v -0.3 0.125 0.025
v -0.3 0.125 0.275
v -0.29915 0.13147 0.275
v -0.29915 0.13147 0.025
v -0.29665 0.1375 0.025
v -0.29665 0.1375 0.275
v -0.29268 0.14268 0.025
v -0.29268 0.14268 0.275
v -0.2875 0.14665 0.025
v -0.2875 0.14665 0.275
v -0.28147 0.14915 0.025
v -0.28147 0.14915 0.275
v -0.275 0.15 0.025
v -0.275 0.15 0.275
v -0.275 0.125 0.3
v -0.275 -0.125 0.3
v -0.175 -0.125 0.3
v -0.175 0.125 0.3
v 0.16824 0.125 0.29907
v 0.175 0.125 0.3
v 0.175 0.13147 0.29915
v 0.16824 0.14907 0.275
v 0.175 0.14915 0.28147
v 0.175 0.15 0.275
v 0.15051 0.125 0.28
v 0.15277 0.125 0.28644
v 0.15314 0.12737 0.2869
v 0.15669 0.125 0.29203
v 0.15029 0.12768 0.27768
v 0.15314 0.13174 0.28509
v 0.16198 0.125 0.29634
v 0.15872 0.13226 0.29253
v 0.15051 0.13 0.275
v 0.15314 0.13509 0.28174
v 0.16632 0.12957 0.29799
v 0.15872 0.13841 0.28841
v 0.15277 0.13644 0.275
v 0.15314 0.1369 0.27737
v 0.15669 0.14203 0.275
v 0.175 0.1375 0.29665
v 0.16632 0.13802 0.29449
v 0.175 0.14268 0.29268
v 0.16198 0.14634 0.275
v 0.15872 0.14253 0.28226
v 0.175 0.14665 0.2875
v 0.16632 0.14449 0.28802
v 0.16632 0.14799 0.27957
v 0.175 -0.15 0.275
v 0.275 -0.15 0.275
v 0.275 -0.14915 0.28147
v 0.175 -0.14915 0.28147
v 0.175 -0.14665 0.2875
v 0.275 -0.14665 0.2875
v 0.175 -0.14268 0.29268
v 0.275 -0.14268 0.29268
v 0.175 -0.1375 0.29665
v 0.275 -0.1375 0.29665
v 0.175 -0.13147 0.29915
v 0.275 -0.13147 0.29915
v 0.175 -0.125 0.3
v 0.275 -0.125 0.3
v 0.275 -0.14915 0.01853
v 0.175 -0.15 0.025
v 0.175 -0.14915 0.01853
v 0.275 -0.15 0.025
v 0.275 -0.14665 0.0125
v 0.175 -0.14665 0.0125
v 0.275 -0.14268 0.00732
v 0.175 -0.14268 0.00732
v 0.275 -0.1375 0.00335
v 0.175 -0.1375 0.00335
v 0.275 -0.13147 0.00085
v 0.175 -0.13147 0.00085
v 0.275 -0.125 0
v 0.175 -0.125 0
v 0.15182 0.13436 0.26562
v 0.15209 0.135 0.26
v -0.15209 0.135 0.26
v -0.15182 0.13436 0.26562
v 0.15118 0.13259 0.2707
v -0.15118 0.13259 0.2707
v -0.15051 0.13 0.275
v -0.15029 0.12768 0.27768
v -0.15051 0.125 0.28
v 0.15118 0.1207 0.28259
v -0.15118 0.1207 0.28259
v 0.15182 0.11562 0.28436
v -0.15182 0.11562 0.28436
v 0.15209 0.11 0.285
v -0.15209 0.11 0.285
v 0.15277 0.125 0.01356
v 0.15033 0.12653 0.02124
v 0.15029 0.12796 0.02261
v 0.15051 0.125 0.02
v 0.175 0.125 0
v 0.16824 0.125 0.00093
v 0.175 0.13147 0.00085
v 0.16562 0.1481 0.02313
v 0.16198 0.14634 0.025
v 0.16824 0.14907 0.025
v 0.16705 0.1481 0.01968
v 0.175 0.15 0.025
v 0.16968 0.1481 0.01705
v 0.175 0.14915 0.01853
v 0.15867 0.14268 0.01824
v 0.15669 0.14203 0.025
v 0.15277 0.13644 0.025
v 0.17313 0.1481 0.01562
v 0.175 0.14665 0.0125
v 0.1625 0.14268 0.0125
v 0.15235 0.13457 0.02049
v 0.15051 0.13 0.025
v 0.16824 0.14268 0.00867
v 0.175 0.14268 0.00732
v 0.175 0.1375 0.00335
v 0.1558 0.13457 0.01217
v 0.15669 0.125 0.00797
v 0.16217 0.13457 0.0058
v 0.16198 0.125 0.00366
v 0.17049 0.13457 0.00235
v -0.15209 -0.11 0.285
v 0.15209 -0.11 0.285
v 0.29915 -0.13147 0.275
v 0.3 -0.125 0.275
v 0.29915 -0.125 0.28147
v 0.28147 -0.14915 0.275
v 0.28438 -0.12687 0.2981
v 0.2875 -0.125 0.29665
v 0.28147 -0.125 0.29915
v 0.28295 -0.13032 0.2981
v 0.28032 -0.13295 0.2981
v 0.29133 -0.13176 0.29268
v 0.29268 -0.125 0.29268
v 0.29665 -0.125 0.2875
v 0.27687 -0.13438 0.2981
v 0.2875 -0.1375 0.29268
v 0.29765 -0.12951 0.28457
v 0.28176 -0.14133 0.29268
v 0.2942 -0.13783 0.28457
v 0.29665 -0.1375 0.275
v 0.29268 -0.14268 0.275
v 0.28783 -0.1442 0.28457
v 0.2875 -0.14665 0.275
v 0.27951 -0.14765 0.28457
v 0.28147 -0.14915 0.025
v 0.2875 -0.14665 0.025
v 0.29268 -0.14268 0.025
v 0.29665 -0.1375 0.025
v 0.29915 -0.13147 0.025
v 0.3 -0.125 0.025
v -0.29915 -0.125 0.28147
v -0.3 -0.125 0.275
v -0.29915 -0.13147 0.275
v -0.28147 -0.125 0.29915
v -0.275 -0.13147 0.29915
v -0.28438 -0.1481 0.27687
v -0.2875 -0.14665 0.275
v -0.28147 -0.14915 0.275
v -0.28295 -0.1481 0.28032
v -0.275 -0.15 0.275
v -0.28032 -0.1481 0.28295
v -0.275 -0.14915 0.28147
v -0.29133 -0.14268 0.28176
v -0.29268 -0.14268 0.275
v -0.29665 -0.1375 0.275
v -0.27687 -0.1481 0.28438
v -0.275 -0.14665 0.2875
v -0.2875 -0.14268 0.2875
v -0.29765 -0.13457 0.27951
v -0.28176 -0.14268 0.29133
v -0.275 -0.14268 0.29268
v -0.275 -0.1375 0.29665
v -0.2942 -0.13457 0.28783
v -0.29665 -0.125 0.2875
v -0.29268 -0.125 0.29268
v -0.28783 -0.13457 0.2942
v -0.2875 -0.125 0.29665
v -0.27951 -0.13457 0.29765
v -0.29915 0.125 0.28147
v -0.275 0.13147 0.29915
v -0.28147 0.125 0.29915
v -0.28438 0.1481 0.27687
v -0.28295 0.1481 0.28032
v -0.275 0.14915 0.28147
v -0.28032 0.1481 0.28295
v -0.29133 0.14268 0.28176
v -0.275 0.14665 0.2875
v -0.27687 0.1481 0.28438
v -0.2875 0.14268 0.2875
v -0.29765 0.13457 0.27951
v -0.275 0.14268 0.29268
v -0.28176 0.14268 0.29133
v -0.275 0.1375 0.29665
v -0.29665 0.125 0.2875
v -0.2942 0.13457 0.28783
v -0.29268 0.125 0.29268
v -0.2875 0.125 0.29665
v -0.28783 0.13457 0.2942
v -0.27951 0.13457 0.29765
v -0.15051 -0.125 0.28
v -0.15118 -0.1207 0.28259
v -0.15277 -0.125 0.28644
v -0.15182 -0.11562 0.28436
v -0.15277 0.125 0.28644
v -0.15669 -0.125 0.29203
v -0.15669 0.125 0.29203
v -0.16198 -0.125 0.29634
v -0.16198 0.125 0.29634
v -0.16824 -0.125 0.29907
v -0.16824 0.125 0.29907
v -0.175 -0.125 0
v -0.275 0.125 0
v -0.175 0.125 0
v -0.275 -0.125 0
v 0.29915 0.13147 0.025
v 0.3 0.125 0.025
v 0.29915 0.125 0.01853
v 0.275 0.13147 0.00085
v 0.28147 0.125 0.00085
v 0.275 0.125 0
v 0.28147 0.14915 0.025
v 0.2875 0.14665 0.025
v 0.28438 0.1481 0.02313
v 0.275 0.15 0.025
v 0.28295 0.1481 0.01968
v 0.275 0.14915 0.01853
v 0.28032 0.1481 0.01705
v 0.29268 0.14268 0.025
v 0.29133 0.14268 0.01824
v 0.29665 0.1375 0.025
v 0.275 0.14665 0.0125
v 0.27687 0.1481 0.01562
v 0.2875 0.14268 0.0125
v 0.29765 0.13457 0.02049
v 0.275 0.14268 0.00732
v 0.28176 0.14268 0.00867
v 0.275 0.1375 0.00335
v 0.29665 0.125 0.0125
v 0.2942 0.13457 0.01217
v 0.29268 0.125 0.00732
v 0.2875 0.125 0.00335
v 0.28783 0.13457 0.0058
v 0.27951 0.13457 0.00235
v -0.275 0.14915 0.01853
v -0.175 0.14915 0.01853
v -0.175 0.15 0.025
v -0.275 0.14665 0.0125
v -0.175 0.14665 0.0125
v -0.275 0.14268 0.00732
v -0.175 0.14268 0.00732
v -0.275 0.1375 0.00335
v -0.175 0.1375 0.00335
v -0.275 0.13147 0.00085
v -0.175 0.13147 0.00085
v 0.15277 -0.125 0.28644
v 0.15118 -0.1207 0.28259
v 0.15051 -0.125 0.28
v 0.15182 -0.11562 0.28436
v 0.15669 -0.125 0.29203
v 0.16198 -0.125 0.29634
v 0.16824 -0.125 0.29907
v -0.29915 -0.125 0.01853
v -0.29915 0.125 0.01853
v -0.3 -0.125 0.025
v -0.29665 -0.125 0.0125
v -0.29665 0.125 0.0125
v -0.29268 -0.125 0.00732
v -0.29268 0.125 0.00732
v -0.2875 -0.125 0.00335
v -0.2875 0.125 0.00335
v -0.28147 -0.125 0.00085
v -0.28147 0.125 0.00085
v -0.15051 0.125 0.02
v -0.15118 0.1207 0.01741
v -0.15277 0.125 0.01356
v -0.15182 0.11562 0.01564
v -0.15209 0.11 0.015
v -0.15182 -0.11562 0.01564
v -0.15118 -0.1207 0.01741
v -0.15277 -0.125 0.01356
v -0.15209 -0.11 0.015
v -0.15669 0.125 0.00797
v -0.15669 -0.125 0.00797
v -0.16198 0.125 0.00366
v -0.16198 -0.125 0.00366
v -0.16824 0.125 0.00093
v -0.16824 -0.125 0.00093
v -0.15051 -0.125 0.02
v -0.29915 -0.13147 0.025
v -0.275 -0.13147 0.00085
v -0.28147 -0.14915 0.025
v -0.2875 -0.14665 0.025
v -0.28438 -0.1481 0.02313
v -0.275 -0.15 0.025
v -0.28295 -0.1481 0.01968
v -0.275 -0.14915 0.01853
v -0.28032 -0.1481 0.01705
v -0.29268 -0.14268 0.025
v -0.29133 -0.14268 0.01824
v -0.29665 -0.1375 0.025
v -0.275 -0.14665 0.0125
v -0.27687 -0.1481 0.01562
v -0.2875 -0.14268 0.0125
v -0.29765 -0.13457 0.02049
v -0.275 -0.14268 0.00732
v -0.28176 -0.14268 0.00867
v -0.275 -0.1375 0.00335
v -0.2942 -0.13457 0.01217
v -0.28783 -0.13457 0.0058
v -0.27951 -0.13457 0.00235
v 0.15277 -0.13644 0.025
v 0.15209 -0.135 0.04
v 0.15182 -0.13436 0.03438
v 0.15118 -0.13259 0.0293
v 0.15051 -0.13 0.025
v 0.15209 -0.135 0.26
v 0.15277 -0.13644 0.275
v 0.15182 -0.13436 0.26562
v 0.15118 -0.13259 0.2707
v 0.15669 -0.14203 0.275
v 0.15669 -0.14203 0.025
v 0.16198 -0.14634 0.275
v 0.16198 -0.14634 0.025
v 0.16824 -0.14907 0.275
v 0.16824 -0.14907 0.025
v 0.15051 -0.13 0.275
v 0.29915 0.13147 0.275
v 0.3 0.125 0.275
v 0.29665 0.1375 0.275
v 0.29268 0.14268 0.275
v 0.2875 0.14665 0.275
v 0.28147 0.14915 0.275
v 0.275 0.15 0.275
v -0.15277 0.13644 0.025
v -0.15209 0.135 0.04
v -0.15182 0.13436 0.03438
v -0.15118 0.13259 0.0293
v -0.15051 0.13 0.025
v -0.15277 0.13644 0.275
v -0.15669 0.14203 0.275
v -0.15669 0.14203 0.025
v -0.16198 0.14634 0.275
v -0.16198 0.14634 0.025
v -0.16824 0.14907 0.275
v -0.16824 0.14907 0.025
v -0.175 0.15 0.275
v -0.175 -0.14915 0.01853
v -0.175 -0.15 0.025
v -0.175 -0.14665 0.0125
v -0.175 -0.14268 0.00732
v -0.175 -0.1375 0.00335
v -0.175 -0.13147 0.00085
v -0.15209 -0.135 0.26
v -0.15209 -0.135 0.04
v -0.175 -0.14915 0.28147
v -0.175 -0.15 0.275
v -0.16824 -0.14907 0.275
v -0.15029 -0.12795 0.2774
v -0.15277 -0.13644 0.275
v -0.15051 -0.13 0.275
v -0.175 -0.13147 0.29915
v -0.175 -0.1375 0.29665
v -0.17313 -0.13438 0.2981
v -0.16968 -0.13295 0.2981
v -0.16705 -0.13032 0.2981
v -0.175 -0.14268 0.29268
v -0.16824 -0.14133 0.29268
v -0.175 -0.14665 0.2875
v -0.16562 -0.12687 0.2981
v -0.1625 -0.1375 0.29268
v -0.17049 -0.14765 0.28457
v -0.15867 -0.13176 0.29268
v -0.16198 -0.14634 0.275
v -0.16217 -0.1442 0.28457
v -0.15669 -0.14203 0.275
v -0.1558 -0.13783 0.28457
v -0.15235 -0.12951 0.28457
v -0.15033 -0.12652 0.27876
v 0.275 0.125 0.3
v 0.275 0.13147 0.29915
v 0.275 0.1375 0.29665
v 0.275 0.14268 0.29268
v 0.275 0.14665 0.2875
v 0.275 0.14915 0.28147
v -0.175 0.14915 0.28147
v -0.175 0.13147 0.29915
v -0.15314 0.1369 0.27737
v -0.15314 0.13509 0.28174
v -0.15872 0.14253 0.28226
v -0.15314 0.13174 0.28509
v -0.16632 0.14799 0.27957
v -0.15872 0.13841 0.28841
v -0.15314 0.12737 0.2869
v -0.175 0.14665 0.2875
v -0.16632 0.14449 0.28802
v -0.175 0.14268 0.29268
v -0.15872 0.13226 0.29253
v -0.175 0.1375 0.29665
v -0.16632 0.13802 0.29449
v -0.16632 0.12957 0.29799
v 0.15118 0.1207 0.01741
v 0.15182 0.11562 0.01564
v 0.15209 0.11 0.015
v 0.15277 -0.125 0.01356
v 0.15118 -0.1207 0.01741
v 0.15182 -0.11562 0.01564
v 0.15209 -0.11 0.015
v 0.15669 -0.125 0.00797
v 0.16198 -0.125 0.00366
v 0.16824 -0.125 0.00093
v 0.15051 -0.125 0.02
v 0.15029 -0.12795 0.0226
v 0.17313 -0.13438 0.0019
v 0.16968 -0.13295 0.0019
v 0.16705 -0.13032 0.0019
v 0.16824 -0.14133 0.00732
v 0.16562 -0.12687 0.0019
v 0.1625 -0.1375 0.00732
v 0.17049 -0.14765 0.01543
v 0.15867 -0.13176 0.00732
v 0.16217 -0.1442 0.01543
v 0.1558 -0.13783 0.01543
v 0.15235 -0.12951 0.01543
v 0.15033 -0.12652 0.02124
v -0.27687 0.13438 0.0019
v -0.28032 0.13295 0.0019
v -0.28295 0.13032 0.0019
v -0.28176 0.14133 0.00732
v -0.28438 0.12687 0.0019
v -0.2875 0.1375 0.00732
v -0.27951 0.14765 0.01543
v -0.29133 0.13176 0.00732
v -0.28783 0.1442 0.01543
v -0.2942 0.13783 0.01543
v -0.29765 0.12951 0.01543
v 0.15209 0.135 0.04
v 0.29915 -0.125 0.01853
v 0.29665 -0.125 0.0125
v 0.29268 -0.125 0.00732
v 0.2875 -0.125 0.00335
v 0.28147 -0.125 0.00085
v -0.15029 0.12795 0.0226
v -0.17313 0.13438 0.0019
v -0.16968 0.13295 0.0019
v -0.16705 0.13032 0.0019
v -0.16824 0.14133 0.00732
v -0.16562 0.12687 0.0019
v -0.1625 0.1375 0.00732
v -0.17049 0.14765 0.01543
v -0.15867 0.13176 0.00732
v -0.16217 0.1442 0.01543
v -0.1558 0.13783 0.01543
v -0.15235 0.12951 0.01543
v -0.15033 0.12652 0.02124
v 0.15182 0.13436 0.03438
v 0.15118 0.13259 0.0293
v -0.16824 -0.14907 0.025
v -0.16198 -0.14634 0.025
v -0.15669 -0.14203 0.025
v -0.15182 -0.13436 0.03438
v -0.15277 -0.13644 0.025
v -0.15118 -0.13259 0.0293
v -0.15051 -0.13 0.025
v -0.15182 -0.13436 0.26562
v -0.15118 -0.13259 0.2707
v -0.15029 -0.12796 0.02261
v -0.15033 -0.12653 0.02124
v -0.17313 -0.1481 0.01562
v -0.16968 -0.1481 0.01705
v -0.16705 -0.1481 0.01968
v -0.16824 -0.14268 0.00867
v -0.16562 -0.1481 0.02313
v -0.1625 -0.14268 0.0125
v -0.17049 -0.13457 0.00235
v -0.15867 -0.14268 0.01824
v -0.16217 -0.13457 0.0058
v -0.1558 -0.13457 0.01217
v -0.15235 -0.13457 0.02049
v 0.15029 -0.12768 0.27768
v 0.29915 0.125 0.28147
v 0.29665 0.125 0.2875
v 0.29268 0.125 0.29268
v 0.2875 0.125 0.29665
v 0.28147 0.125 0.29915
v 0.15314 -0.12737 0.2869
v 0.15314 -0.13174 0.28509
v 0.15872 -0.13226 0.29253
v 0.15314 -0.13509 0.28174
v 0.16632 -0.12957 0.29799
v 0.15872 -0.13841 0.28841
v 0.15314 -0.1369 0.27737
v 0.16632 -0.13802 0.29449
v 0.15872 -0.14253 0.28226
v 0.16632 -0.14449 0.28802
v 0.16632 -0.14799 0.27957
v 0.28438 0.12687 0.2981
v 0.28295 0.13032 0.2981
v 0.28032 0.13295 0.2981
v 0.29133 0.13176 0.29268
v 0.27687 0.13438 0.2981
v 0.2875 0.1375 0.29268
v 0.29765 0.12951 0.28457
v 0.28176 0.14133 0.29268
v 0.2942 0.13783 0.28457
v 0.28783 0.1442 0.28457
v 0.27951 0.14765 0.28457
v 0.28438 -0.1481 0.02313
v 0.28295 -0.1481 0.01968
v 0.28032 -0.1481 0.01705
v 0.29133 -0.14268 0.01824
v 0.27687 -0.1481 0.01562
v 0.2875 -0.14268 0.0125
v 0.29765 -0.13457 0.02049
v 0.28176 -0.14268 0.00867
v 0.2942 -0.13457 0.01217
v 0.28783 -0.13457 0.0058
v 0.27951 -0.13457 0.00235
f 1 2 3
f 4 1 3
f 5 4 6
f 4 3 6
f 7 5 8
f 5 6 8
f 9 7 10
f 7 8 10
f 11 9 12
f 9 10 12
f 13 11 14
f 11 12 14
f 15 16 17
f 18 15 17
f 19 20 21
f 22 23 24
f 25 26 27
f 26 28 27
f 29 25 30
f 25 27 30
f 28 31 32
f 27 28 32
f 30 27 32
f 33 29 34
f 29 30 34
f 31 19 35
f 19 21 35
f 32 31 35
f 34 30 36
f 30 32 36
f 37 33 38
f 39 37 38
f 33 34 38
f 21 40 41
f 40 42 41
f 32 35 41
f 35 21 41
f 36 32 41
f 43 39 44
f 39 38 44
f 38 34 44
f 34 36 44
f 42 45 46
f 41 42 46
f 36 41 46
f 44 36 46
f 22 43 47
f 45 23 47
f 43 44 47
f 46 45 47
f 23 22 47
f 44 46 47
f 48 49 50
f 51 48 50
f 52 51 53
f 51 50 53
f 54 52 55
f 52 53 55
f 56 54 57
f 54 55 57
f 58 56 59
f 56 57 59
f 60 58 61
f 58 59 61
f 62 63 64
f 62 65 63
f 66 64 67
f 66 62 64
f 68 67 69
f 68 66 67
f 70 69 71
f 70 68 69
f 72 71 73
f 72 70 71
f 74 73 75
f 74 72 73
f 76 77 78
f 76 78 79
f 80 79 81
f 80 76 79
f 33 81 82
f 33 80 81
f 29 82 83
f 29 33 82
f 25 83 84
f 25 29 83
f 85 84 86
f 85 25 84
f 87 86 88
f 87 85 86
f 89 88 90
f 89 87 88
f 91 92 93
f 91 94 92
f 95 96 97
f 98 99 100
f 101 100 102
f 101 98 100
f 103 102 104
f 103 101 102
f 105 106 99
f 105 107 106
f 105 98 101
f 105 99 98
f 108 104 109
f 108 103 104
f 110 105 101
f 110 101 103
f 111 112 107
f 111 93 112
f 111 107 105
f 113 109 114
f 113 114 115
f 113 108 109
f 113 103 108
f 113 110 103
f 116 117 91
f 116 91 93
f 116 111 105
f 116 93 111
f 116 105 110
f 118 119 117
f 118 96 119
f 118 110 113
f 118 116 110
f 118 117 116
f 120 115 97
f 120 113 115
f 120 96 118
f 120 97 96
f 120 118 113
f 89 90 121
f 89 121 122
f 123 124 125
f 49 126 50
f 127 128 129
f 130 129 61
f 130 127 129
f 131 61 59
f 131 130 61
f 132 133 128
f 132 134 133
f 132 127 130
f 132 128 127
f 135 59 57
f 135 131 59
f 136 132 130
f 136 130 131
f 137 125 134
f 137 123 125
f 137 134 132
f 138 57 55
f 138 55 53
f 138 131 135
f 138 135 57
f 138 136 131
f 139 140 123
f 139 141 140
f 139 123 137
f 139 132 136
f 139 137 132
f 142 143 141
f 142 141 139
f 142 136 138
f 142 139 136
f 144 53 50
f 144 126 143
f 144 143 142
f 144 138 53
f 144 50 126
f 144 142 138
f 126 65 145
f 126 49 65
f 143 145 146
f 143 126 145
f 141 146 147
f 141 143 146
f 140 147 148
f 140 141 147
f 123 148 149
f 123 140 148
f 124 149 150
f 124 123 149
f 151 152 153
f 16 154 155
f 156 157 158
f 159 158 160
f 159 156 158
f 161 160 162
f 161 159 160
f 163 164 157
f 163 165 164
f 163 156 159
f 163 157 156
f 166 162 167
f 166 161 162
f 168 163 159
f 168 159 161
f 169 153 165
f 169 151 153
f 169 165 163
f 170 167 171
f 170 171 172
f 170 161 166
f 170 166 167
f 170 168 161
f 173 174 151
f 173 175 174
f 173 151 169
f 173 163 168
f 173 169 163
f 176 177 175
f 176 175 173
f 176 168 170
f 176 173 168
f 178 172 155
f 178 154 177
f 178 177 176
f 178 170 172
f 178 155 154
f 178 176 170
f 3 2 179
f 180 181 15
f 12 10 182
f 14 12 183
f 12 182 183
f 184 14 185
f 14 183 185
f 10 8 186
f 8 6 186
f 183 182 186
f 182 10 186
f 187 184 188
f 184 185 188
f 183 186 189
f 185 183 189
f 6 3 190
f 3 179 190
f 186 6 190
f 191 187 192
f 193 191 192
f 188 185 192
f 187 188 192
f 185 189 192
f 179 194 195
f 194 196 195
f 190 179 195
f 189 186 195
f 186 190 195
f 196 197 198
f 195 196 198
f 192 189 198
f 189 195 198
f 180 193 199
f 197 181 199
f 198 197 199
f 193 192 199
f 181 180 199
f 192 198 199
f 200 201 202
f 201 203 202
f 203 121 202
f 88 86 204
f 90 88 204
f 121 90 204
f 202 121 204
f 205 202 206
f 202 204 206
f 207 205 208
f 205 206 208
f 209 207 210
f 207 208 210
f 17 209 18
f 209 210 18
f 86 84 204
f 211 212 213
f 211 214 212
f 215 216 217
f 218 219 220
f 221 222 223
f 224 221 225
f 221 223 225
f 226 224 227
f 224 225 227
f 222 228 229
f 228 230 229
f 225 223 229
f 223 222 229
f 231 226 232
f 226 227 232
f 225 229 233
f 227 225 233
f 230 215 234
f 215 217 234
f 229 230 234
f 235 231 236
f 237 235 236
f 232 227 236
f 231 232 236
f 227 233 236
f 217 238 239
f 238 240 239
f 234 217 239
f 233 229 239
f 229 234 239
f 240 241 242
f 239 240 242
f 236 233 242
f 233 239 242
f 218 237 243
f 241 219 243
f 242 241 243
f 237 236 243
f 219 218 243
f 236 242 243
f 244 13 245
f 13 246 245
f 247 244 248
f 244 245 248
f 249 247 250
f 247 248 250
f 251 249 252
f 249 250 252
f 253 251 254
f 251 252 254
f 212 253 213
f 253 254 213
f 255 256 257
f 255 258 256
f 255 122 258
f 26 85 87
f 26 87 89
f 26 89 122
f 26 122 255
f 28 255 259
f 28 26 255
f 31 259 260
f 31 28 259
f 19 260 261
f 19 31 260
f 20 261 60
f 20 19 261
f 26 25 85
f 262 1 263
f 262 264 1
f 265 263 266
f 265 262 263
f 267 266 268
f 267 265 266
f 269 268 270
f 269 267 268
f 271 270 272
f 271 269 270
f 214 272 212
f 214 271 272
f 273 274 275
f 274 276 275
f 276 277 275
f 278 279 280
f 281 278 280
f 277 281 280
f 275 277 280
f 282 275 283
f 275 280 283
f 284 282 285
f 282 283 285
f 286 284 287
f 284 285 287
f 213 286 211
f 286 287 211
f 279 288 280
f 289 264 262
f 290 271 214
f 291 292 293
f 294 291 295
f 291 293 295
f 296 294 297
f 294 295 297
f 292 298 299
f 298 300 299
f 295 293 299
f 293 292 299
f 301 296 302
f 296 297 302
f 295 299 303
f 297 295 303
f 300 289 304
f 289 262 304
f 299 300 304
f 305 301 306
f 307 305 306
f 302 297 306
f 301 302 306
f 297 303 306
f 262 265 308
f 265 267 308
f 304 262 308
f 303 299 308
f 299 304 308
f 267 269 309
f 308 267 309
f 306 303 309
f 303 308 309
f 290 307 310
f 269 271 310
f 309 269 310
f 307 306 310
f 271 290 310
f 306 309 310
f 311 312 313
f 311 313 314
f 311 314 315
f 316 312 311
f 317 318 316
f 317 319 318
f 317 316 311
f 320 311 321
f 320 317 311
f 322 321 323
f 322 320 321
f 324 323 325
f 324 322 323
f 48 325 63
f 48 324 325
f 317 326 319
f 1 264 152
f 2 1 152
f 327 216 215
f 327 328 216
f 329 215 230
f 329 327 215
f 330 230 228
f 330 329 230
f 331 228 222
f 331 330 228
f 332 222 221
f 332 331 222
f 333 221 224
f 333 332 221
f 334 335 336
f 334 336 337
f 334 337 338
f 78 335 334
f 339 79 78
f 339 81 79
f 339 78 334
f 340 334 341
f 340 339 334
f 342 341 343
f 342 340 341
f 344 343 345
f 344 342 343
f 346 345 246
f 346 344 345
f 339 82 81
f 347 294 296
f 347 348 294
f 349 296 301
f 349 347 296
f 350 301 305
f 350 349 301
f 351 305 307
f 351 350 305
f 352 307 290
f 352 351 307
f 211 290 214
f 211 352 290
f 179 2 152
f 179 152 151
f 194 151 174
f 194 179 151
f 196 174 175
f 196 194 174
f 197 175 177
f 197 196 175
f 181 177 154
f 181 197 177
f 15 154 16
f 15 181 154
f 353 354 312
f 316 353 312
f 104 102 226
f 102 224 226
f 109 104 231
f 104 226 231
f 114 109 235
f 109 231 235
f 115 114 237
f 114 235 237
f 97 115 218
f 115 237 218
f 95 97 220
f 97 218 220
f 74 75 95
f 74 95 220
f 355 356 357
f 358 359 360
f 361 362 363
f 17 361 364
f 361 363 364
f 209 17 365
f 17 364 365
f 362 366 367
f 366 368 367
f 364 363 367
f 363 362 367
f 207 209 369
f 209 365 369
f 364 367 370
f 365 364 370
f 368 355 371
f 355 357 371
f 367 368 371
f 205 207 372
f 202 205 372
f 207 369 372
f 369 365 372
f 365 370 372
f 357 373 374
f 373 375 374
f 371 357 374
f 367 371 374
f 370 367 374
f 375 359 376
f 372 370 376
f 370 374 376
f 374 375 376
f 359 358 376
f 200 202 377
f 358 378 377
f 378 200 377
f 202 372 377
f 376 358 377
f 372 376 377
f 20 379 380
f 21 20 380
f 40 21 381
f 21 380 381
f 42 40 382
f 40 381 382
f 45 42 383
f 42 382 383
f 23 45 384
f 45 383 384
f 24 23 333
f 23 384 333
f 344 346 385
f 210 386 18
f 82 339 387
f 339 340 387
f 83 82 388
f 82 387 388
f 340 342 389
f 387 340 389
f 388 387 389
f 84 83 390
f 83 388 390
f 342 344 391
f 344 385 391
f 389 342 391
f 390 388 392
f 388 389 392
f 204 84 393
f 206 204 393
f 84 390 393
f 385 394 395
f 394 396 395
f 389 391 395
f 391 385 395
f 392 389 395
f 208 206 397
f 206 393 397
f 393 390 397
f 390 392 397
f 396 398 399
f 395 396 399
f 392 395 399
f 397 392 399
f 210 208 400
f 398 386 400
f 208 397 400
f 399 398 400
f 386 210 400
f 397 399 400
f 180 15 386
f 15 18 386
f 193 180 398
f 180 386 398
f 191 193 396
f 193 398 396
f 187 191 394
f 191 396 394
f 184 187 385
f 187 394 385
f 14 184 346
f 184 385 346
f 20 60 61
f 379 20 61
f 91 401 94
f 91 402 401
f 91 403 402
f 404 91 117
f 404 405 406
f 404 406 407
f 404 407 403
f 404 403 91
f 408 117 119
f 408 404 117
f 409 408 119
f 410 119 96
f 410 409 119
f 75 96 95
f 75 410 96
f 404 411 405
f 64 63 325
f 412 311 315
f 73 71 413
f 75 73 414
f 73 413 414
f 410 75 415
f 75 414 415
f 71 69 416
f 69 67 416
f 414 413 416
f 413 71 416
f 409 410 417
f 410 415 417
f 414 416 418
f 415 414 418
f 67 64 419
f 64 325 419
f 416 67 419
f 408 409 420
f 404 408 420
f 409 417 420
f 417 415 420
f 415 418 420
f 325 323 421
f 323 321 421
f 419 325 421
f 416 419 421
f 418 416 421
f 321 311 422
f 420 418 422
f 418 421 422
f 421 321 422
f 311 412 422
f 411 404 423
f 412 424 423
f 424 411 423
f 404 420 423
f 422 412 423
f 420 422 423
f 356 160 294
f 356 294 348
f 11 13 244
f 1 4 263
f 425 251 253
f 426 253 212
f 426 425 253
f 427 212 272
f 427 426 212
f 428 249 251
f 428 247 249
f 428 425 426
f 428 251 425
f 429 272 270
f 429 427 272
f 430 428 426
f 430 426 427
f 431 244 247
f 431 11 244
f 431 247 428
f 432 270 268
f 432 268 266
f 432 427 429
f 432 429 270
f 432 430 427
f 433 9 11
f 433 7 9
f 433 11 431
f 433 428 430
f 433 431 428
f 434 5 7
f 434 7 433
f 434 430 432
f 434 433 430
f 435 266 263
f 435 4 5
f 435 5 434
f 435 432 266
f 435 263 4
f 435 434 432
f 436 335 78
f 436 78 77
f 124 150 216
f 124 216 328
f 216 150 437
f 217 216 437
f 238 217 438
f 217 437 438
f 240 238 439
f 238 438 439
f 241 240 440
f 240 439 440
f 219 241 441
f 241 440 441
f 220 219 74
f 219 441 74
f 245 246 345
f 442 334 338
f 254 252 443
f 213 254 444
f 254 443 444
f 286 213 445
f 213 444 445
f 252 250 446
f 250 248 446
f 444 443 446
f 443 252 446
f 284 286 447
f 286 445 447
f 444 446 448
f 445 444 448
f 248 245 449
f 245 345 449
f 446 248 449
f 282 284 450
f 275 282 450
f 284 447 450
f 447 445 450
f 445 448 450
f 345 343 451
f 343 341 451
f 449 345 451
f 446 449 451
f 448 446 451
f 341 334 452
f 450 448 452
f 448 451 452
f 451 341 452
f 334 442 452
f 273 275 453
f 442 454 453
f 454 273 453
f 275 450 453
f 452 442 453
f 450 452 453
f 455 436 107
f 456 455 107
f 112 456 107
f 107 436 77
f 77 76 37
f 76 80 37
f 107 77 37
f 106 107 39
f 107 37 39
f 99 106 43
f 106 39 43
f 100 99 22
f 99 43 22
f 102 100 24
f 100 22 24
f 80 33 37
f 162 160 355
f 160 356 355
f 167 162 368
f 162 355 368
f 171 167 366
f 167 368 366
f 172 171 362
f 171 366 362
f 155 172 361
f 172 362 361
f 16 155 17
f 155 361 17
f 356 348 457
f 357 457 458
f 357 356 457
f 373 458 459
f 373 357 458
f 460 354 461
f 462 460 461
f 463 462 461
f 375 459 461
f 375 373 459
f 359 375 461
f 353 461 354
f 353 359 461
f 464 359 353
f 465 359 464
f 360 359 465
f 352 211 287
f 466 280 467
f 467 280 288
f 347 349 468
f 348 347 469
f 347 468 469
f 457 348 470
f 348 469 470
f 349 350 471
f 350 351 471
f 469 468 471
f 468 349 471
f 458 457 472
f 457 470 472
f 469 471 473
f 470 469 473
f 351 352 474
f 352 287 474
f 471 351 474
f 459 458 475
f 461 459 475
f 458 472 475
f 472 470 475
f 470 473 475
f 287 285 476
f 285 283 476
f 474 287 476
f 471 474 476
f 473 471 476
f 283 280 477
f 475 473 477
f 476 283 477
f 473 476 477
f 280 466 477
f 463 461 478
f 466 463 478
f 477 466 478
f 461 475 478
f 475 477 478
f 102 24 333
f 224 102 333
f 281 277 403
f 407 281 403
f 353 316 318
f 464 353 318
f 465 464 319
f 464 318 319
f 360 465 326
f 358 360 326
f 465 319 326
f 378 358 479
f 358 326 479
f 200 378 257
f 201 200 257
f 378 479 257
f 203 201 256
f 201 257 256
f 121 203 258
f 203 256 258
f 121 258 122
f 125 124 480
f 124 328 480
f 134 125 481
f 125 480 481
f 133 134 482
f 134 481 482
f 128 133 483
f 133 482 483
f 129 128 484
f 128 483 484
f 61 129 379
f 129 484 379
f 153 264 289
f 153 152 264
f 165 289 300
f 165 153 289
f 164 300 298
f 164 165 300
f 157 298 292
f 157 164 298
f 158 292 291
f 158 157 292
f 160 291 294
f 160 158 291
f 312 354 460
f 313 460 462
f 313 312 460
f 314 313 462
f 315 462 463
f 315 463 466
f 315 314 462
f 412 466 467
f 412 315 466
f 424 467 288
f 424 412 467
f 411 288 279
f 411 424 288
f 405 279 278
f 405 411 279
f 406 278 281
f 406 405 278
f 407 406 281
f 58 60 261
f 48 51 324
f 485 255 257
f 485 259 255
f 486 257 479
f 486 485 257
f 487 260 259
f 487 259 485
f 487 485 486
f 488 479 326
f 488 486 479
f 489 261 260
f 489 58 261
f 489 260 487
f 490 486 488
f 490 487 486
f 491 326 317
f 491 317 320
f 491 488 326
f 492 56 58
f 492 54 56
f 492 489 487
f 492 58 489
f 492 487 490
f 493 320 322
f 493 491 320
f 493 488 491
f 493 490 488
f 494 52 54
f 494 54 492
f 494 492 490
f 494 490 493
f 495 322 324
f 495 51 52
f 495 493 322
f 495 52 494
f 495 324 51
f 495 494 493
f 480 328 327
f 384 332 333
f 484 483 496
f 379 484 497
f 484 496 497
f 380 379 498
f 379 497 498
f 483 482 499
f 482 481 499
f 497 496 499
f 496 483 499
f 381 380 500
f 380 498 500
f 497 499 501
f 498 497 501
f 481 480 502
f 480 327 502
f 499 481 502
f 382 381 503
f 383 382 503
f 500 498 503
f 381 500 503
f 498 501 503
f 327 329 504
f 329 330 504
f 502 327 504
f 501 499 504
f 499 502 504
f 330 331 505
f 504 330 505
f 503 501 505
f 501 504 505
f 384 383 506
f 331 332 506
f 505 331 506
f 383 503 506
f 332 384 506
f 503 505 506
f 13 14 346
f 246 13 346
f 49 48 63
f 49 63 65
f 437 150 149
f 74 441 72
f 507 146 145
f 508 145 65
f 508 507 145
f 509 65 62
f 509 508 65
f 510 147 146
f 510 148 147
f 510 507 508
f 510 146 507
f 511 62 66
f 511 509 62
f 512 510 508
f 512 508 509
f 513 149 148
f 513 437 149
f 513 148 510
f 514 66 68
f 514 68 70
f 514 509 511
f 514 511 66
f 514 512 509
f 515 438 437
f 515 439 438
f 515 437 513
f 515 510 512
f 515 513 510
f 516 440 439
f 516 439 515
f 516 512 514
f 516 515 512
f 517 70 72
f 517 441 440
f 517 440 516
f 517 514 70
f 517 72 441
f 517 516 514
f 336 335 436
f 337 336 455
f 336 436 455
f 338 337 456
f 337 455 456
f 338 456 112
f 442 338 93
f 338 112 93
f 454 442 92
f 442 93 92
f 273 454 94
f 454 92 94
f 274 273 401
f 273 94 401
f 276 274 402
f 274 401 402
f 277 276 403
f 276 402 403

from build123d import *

# Parameters (mm, degrees)
SKETCH_W     = 0.54
SKETCH_H     = 0.27
PAD_DEPTH    = 0.27
FILLET002_R  = 0.025
SKETCH001_W  = 0.15
SKETCH001_H  = 0.3
PAD001_DEPTH = 0.15
FILLET_R     = 0.025
SKETCH002_W  = 0.15
SKETCH002_H  = 0.3
PAD002_DEPTH = 0.15
FILLET001_R  = 0.025


with BuildPart() as body:
    # Sketch → Pad (new body)
    with BuildSketch(Plane.XY.offset(0.015)):
        Rectangle(SKETCH_W, SKETCH_H)
    extrude(amount=PAD_DEPTH)

    # Fillet002
    fillet002_edges = [body.edges().sort_by_distance(p)[0] for p in [
        (0, -0.135, 0.285),
        (0, 0.135, 0.285),
        (0, -0.135, 0.015),
        (0, 0.135, 0.015),
    ]]
    fillet(fillet002_edges, radius=FILLET002_R)


with BuildPart() as body001:
    # Sketch001 → Pad001 (new body, symmetric)
    with BuildSketch(Plane.XZ):
        with Locations((-0.225, 0.15)):
            Rectangle(SKETCH001_W, SKETCH001_H)
    extrude(amount=PAD001_DEPTH, both=True)

    # Fillet
    fillet_edges = [body001.edges().sort_by_distance(p)[0] for p in [
        (-0.3, 0, 0.3),
        (-0.3, 0.15, 0.15),
        (-0.225, 0.15, 0.3),
        (-0.15, 0.15, 0.15),
        (-0.225, 0.15, 0),
        (-0.15, 0, 0),
        (-0.3, 0, 0),
        (-0.3, -0.15, 0.15),
        (-0.225, -0.15, 0),
        (-0.15, -0.15, 0.15),
        (-0.225, -0.15, 0.3),
        (-0.15, 0, 0.3),
    ]]
    fillet(fillet_edges, radius=FILLET_R)


with BuildPart() as fusion:
    # Sketch002 → Pad002 (new body, symmetric)
    with BuildSketch(Plane.XZ):
        with Locations((0.225, 0.15)):
            Rectangle(SKETCH002_W, SKETCH002_H)
    extrude(amount=PAD002_DEPTH, both=True)

    # Fillet001
    fillet001_edges = [fusion.edges().sort_by_distance(p)[0] for p in [
        (0.3, 0, 0),
        (0.3, 0.15, 0.15),
        (0.3, -0.15, 0.15),
        (0.3, 0, 0.3),
        (0.225, -0.15, 0.3),
        (0.225, 0.15, 0.3),
        (0.15, 0, 0.3),
        (0.15, -0.15, 0.15),
        (0.225, -0.15, 0),
        (0.15, 0, 0),
        (0.15, 0.15, 0.15),
        (0.225, 0.15, 0),
    ]]
    fillet(fillet001_edges, radius=FILLET001_R)

    # Fusion: union Body, Body001
    add(body.part)
    add(body001.part)


solid = fusion.part
